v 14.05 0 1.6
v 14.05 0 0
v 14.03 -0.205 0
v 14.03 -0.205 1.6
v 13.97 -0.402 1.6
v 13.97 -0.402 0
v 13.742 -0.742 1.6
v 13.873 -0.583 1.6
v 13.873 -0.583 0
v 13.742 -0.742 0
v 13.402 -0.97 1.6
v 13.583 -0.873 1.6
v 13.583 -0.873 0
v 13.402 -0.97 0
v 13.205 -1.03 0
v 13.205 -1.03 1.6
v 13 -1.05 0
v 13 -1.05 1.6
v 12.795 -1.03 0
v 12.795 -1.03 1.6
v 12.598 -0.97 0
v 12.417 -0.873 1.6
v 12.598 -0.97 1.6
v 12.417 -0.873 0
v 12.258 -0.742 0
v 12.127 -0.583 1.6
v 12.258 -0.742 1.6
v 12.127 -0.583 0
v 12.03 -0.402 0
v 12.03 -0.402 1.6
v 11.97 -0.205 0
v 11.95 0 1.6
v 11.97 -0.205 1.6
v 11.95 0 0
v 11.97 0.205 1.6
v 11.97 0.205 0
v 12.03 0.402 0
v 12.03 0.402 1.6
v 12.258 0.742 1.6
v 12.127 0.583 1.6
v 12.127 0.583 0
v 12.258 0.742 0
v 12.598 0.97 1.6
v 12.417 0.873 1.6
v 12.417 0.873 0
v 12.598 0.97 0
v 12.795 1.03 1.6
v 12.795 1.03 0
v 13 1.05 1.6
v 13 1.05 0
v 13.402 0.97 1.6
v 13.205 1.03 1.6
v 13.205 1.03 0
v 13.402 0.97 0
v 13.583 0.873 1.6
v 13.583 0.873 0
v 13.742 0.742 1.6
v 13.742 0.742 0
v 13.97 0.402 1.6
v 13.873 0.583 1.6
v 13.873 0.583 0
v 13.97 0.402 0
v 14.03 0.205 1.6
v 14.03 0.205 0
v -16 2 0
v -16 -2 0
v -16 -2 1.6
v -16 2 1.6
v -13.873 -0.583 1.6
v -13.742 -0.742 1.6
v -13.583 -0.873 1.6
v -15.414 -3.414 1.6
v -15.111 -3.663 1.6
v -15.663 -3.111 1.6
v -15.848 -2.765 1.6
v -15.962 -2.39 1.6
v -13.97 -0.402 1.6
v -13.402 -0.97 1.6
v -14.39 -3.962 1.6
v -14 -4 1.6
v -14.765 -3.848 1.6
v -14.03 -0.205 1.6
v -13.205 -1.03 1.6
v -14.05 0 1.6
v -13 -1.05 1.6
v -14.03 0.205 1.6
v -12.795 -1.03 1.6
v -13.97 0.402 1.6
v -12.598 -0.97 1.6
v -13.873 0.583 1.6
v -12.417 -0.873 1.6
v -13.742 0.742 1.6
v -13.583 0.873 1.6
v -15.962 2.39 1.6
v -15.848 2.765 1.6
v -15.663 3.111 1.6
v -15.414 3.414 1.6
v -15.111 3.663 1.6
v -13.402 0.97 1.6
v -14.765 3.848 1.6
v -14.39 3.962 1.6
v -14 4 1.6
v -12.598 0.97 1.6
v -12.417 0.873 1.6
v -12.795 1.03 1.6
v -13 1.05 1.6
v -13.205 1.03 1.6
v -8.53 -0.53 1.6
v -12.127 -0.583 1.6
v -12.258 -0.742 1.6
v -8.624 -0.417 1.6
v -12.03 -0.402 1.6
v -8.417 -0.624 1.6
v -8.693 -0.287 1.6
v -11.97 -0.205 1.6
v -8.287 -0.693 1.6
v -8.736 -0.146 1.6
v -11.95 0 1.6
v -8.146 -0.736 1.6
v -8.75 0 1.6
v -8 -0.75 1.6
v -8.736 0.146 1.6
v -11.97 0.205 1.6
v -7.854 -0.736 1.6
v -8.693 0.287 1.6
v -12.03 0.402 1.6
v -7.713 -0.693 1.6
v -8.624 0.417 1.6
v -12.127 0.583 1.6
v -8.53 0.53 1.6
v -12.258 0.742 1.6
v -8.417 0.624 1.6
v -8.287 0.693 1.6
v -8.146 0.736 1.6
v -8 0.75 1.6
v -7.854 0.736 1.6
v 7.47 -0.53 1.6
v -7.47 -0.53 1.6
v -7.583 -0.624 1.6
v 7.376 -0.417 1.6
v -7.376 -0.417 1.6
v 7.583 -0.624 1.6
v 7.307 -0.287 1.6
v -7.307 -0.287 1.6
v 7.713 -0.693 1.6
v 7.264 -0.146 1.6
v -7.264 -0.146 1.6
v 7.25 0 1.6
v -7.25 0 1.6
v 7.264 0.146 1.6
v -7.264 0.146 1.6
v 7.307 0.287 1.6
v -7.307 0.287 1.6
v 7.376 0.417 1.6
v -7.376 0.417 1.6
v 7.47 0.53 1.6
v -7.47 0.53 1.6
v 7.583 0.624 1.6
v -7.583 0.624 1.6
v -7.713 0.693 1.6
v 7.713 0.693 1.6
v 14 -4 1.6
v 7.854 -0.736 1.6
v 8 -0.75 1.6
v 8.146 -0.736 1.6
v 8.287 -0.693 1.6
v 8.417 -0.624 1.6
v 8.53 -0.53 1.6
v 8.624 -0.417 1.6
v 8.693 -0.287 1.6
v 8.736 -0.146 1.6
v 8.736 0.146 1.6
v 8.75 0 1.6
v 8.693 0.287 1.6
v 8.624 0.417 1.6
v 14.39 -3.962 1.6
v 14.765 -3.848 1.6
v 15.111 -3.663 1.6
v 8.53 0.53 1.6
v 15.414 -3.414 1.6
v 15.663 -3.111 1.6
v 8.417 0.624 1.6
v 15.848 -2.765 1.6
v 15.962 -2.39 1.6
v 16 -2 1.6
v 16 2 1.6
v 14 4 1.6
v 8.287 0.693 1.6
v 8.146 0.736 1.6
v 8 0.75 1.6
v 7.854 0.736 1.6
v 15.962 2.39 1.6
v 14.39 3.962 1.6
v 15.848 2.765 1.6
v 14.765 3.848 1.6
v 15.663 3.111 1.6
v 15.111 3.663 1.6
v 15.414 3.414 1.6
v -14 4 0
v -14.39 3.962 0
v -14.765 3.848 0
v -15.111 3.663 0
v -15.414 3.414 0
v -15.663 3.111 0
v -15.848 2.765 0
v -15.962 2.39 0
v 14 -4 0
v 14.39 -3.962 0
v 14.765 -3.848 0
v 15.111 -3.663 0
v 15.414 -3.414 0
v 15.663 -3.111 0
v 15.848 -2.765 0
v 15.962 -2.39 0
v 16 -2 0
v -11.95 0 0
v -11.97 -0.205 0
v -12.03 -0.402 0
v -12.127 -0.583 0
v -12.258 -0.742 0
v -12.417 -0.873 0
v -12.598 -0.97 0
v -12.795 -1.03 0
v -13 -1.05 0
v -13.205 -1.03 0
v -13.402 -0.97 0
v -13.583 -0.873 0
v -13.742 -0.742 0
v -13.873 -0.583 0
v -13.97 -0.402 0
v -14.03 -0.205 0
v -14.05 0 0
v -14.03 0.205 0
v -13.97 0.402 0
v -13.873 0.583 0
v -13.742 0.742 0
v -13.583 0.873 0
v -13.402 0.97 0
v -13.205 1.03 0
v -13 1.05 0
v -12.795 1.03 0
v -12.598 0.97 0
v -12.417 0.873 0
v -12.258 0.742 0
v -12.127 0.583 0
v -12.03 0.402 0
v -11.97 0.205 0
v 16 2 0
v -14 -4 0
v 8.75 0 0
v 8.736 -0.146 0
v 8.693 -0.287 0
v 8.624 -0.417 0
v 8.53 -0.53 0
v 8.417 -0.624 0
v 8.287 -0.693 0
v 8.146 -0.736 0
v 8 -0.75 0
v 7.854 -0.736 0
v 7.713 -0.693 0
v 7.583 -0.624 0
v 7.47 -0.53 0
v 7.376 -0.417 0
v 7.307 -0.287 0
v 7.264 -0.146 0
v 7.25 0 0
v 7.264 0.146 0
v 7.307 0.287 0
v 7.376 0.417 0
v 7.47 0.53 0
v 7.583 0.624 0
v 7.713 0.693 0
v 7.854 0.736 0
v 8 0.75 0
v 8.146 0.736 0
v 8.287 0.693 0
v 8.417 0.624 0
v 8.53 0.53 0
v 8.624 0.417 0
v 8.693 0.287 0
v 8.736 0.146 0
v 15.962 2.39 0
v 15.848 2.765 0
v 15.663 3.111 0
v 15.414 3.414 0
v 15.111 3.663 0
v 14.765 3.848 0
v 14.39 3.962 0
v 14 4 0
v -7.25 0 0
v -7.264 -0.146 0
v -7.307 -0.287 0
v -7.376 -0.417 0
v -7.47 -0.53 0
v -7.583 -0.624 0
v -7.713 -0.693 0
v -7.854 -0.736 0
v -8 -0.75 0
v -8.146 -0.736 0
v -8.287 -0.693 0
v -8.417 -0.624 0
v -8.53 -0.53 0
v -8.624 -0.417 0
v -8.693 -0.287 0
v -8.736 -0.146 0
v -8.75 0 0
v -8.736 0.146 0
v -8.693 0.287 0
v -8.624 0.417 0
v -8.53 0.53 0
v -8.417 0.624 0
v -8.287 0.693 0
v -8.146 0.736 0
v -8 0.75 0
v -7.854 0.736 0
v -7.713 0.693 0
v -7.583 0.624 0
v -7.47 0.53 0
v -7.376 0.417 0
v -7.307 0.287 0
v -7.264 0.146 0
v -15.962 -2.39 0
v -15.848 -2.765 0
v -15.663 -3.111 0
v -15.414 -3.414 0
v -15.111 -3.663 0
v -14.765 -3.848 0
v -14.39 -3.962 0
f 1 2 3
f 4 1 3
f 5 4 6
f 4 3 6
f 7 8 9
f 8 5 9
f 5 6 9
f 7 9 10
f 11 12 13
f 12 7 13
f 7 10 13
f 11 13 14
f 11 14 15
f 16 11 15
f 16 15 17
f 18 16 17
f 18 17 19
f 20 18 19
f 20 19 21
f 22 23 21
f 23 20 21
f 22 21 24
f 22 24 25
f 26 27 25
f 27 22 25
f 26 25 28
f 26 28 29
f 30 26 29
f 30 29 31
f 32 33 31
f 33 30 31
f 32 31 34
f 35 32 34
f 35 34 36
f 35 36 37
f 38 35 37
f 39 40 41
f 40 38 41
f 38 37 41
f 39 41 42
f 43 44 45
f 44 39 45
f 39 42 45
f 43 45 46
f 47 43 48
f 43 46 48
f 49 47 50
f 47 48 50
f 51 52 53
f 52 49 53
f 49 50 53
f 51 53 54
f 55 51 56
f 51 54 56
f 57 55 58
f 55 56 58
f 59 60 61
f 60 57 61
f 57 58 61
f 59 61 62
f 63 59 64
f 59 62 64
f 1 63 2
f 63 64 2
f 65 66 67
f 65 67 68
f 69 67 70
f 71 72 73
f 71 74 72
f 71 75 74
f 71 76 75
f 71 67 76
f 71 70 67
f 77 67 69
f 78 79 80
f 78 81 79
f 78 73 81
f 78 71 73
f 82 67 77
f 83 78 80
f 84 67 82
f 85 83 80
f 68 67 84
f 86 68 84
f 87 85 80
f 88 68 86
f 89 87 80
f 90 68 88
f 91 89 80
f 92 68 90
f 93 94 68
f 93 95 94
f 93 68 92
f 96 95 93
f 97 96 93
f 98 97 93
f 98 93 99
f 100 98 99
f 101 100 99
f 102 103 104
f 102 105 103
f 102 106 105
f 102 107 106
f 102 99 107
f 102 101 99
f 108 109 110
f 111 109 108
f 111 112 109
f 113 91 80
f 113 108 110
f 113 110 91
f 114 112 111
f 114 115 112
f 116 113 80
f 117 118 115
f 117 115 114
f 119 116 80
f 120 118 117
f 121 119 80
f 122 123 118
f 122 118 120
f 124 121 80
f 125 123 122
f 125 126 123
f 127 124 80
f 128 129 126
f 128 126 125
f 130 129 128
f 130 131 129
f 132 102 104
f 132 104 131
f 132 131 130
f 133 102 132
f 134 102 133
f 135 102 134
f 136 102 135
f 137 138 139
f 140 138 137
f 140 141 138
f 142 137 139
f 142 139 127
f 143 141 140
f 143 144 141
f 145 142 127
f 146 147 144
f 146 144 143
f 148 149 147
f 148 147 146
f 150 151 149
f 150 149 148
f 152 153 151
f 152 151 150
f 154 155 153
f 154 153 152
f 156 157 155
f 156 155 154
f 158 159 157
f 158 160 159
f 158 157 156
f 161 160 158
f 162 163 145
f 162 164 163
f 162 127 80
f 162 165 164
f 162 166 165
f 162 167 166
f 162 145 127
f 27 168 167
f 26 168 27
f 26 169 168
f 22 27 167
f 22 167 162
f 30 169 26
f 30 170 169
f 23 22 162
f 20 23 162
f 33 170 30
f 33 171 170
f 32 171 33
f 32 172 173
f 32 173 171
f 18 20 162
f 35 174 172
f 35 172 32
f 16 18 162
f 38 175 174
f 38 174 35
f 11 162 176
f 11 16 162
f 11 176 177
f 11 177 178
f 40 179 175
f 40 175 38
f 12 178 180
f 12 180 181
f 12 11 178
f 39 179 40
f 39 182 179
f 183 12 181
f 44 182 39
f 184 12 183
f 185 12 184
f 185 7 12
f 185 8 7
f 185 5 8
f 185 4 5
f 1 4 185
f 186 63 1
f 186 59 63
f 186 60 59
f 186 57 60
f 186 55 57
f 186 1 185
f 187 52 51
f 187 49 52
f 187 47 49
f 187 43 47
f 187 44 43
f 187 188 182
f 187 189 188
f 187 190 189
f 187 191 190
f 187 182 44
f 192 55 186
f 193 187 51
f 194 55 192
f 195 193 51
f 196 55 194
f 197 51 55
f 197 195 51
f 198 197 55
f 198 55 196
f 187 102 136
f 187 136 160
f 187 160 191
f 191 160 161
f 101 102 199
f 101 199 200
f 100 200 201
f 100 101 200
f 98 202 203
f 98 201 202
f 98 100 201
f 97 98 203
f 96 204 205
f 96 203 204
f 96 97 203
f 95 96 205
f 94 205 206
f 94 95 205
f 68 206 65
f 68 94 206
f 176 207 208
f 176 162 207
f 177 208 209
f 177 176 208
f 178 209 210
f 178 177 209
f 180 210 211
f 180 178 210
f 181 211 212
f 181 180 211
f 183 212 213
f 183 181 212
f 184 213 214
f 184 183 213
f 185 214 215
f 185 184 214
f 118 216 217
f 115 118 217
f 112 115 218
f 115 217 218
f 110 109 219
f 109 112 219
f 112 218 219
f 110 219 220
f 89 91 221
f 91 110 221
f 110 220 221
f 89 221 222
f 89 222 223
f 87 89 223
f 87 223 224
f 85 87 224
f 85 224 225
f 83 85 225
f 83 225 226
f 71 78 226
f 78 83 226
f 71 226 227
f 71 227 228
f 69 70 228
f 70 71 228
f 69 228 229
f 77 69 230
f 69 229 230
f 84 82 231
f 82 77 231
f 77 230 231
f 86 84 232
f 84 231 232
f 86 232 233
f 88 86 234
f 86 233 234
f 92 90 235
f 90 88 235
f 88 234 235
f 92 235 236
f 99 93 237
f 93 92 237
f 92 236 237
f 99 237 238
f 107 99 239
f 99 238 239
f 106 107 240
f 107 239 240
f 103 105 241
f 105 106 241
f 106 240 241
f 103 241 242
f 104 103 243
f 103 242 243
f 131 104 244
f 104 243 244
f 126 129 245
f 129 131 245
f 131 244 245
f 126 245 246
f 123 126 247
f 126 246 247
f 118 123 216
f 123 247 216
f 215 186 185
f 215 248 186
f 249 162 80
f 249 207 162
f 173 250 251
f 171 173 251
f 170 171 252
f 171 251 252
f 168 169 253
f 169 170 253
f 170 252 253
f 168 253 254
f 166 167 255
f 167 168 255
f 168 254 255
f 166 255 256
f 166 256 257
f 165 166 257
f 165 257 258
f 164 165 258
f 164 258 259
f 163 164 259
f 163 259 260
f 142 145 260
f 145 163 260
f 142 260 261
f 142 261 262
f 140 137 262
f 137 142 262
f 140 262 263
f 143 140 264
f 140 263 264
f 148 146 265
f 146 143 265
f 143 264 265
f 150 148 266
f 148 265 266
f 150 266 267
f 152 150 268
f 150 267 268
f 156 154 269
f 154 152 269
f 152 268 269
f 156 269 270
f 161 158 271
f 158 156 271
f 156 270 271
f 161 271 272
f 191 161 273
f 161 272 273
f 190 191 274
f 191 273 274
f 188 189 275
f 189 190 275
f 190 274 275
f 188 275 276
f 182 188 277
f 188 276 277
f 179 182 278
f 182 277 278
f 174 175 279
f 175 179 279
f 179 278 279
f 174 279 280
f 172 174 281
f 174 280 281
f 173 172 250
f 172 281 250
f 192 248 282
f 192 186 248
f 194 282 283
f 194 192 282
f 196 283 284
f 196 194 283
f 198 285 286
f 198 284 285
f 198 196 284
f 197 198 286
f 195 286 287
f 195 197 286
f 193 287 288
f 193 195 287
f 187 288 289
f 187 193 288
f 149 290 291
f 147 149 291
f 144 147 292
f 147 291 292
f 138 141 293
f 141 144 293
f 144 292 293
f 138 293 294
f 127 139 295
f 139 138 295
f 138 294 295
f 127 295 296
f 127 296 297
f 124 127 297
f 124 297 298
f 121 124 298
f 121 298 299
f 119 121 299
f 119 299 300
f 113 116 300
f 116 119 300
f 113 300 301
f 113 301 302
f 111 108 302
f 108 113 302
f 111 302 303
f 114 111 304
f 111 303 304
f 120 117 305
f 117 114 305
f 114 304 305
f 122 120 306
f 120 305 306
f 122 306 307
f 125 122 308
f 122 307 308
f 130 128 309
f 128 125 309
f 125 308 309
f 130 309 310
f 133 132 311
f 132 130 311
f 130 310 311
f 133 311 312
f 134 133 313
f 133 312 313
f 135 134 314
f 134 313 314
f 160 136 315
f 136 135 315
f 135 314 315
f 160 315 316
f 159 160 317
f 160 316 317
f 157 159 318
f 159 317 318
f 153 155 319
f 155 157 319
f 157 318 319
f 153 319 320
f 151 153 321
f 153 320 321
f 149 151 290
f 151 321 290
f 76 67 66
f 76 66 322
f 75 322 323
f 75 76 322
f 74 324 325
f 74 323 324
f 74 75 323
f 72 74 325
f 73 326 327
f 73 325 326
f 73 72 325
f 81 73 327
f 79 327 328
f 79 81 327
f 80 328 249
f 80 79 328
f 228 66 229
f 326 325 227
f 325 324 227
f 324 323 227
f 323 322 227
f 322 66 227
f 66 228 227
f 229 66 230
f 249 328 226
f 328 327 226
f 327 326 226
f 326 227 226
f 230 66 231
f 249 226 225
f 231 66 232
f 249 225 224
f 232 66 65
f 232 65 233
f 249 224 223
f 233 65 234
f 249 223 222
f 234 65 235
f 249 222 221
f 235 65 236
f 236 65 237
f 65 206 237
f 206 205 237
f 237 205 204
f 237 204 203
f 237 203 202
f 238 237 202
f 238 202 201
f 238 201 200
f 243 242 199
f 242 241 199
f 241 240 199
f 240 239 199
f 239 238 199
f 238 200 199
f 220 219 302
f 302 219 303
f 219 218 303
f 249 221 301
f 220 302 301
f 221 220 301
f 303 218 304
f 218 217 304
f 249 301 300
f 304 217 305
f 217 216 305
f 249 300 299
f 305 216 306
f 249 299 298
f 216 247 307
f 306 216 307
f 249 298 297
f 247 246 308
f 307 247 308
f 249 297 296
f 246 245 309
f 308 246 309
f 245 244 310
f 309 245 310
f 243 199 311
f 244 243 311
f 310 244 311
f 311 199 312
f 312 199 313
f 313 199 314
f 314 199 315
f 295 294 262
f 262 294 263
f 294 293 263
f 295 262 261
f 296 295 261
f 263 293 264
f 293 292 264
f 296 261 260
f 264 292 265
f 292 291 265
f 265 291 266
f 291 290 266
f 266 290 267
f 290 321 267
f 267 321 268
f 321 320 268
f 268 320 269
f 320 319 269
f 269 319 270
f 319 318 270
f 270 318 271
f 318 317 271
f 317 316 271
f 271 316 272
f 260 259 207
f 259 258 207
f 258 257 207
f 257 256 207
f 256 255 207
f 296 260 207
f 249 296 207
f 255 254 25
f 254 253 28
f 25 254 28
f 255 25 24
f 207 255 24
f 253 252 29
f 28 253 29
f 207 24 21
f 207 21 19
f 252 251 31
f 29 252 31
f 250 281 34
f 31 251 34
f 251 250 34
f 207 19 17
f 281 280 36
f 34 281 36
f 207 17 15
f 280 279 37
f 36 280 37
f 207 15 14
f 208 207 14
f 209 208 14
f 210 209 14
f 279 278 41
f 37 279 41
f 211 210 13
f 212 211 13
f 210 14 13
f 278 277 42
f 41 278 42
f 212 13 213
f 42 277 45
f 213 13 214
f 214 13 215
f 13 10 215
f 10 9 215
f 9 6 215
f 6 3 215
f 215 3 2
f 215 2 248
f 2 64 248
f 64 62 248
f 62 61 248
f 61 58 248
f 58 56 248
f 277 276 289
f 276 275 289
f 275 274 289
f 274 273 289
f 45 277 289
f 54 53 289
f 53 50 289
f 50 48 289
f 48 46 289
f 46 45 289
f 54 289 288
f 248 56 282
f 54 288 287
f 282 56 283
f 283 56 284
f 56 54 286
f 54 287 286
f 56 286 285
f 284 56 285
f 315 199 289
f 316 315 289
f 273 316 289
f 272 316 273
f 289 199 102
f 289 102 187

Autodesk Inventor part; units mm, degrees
ref_plane "YZ Plane" through (0, 0, 0) normal (1, 0, 0) x (0, 1, 0)
ref_plane "XZ Plane" through (0, 0, 0) normal (0, 1, 0) x (-1, 0, 0)
ref_plane "XY Plane" through (0, 0, 0) normal (0, 0, 1) x (1, 0, 0)
sketch "スケッチ1" plane through (0, 0, 0) normal (0, 0, 1) x (1, 0, 0)
  line L0 (16, -4) -> (-16, -4)
  line L1 (-16, -4) -> (-16, 4)
  line L2 (-16, 4) -> (16, 4)
  line L3 (16, 4) -> (16, -4)
  line L4 (16, -4) -> (-16, 4) construction
  line L5 (-16, -4) -> (16, 4) construction
  circle A0 centre (8, 0) radius 0.75
  circle A1 centre (13, 0) radius 1.05
  circle A2 centre (-8, 0) radius 0.75
  circle A3 centre (-13, 0) radius 1.05
  point P0 (0, 0)
  point P1 (0, 0)
  point P2 (0, 0)
  dimension "d0" = 8
  dimension "d1" = 8
  dimension "d2" = 8
  dimension "d3" = 1.5
  dimension "d4" = 2.1
  dimension "d5" = 13
  dimension "d6" = 3
  dimension "d7" = 13
extrude "押し出し1" add sketch "スケッチ1" along normal blind 1.6
fillet "フィレット1" radius 2 4 edges at (-16, 4, 0.8) (16, 4, 0.8) (16, -4, 0.8) (-16, -4, 0.8)
properties part number "Parts_PCB_BatteryProbePCB" material "ガラス繊維バット"
